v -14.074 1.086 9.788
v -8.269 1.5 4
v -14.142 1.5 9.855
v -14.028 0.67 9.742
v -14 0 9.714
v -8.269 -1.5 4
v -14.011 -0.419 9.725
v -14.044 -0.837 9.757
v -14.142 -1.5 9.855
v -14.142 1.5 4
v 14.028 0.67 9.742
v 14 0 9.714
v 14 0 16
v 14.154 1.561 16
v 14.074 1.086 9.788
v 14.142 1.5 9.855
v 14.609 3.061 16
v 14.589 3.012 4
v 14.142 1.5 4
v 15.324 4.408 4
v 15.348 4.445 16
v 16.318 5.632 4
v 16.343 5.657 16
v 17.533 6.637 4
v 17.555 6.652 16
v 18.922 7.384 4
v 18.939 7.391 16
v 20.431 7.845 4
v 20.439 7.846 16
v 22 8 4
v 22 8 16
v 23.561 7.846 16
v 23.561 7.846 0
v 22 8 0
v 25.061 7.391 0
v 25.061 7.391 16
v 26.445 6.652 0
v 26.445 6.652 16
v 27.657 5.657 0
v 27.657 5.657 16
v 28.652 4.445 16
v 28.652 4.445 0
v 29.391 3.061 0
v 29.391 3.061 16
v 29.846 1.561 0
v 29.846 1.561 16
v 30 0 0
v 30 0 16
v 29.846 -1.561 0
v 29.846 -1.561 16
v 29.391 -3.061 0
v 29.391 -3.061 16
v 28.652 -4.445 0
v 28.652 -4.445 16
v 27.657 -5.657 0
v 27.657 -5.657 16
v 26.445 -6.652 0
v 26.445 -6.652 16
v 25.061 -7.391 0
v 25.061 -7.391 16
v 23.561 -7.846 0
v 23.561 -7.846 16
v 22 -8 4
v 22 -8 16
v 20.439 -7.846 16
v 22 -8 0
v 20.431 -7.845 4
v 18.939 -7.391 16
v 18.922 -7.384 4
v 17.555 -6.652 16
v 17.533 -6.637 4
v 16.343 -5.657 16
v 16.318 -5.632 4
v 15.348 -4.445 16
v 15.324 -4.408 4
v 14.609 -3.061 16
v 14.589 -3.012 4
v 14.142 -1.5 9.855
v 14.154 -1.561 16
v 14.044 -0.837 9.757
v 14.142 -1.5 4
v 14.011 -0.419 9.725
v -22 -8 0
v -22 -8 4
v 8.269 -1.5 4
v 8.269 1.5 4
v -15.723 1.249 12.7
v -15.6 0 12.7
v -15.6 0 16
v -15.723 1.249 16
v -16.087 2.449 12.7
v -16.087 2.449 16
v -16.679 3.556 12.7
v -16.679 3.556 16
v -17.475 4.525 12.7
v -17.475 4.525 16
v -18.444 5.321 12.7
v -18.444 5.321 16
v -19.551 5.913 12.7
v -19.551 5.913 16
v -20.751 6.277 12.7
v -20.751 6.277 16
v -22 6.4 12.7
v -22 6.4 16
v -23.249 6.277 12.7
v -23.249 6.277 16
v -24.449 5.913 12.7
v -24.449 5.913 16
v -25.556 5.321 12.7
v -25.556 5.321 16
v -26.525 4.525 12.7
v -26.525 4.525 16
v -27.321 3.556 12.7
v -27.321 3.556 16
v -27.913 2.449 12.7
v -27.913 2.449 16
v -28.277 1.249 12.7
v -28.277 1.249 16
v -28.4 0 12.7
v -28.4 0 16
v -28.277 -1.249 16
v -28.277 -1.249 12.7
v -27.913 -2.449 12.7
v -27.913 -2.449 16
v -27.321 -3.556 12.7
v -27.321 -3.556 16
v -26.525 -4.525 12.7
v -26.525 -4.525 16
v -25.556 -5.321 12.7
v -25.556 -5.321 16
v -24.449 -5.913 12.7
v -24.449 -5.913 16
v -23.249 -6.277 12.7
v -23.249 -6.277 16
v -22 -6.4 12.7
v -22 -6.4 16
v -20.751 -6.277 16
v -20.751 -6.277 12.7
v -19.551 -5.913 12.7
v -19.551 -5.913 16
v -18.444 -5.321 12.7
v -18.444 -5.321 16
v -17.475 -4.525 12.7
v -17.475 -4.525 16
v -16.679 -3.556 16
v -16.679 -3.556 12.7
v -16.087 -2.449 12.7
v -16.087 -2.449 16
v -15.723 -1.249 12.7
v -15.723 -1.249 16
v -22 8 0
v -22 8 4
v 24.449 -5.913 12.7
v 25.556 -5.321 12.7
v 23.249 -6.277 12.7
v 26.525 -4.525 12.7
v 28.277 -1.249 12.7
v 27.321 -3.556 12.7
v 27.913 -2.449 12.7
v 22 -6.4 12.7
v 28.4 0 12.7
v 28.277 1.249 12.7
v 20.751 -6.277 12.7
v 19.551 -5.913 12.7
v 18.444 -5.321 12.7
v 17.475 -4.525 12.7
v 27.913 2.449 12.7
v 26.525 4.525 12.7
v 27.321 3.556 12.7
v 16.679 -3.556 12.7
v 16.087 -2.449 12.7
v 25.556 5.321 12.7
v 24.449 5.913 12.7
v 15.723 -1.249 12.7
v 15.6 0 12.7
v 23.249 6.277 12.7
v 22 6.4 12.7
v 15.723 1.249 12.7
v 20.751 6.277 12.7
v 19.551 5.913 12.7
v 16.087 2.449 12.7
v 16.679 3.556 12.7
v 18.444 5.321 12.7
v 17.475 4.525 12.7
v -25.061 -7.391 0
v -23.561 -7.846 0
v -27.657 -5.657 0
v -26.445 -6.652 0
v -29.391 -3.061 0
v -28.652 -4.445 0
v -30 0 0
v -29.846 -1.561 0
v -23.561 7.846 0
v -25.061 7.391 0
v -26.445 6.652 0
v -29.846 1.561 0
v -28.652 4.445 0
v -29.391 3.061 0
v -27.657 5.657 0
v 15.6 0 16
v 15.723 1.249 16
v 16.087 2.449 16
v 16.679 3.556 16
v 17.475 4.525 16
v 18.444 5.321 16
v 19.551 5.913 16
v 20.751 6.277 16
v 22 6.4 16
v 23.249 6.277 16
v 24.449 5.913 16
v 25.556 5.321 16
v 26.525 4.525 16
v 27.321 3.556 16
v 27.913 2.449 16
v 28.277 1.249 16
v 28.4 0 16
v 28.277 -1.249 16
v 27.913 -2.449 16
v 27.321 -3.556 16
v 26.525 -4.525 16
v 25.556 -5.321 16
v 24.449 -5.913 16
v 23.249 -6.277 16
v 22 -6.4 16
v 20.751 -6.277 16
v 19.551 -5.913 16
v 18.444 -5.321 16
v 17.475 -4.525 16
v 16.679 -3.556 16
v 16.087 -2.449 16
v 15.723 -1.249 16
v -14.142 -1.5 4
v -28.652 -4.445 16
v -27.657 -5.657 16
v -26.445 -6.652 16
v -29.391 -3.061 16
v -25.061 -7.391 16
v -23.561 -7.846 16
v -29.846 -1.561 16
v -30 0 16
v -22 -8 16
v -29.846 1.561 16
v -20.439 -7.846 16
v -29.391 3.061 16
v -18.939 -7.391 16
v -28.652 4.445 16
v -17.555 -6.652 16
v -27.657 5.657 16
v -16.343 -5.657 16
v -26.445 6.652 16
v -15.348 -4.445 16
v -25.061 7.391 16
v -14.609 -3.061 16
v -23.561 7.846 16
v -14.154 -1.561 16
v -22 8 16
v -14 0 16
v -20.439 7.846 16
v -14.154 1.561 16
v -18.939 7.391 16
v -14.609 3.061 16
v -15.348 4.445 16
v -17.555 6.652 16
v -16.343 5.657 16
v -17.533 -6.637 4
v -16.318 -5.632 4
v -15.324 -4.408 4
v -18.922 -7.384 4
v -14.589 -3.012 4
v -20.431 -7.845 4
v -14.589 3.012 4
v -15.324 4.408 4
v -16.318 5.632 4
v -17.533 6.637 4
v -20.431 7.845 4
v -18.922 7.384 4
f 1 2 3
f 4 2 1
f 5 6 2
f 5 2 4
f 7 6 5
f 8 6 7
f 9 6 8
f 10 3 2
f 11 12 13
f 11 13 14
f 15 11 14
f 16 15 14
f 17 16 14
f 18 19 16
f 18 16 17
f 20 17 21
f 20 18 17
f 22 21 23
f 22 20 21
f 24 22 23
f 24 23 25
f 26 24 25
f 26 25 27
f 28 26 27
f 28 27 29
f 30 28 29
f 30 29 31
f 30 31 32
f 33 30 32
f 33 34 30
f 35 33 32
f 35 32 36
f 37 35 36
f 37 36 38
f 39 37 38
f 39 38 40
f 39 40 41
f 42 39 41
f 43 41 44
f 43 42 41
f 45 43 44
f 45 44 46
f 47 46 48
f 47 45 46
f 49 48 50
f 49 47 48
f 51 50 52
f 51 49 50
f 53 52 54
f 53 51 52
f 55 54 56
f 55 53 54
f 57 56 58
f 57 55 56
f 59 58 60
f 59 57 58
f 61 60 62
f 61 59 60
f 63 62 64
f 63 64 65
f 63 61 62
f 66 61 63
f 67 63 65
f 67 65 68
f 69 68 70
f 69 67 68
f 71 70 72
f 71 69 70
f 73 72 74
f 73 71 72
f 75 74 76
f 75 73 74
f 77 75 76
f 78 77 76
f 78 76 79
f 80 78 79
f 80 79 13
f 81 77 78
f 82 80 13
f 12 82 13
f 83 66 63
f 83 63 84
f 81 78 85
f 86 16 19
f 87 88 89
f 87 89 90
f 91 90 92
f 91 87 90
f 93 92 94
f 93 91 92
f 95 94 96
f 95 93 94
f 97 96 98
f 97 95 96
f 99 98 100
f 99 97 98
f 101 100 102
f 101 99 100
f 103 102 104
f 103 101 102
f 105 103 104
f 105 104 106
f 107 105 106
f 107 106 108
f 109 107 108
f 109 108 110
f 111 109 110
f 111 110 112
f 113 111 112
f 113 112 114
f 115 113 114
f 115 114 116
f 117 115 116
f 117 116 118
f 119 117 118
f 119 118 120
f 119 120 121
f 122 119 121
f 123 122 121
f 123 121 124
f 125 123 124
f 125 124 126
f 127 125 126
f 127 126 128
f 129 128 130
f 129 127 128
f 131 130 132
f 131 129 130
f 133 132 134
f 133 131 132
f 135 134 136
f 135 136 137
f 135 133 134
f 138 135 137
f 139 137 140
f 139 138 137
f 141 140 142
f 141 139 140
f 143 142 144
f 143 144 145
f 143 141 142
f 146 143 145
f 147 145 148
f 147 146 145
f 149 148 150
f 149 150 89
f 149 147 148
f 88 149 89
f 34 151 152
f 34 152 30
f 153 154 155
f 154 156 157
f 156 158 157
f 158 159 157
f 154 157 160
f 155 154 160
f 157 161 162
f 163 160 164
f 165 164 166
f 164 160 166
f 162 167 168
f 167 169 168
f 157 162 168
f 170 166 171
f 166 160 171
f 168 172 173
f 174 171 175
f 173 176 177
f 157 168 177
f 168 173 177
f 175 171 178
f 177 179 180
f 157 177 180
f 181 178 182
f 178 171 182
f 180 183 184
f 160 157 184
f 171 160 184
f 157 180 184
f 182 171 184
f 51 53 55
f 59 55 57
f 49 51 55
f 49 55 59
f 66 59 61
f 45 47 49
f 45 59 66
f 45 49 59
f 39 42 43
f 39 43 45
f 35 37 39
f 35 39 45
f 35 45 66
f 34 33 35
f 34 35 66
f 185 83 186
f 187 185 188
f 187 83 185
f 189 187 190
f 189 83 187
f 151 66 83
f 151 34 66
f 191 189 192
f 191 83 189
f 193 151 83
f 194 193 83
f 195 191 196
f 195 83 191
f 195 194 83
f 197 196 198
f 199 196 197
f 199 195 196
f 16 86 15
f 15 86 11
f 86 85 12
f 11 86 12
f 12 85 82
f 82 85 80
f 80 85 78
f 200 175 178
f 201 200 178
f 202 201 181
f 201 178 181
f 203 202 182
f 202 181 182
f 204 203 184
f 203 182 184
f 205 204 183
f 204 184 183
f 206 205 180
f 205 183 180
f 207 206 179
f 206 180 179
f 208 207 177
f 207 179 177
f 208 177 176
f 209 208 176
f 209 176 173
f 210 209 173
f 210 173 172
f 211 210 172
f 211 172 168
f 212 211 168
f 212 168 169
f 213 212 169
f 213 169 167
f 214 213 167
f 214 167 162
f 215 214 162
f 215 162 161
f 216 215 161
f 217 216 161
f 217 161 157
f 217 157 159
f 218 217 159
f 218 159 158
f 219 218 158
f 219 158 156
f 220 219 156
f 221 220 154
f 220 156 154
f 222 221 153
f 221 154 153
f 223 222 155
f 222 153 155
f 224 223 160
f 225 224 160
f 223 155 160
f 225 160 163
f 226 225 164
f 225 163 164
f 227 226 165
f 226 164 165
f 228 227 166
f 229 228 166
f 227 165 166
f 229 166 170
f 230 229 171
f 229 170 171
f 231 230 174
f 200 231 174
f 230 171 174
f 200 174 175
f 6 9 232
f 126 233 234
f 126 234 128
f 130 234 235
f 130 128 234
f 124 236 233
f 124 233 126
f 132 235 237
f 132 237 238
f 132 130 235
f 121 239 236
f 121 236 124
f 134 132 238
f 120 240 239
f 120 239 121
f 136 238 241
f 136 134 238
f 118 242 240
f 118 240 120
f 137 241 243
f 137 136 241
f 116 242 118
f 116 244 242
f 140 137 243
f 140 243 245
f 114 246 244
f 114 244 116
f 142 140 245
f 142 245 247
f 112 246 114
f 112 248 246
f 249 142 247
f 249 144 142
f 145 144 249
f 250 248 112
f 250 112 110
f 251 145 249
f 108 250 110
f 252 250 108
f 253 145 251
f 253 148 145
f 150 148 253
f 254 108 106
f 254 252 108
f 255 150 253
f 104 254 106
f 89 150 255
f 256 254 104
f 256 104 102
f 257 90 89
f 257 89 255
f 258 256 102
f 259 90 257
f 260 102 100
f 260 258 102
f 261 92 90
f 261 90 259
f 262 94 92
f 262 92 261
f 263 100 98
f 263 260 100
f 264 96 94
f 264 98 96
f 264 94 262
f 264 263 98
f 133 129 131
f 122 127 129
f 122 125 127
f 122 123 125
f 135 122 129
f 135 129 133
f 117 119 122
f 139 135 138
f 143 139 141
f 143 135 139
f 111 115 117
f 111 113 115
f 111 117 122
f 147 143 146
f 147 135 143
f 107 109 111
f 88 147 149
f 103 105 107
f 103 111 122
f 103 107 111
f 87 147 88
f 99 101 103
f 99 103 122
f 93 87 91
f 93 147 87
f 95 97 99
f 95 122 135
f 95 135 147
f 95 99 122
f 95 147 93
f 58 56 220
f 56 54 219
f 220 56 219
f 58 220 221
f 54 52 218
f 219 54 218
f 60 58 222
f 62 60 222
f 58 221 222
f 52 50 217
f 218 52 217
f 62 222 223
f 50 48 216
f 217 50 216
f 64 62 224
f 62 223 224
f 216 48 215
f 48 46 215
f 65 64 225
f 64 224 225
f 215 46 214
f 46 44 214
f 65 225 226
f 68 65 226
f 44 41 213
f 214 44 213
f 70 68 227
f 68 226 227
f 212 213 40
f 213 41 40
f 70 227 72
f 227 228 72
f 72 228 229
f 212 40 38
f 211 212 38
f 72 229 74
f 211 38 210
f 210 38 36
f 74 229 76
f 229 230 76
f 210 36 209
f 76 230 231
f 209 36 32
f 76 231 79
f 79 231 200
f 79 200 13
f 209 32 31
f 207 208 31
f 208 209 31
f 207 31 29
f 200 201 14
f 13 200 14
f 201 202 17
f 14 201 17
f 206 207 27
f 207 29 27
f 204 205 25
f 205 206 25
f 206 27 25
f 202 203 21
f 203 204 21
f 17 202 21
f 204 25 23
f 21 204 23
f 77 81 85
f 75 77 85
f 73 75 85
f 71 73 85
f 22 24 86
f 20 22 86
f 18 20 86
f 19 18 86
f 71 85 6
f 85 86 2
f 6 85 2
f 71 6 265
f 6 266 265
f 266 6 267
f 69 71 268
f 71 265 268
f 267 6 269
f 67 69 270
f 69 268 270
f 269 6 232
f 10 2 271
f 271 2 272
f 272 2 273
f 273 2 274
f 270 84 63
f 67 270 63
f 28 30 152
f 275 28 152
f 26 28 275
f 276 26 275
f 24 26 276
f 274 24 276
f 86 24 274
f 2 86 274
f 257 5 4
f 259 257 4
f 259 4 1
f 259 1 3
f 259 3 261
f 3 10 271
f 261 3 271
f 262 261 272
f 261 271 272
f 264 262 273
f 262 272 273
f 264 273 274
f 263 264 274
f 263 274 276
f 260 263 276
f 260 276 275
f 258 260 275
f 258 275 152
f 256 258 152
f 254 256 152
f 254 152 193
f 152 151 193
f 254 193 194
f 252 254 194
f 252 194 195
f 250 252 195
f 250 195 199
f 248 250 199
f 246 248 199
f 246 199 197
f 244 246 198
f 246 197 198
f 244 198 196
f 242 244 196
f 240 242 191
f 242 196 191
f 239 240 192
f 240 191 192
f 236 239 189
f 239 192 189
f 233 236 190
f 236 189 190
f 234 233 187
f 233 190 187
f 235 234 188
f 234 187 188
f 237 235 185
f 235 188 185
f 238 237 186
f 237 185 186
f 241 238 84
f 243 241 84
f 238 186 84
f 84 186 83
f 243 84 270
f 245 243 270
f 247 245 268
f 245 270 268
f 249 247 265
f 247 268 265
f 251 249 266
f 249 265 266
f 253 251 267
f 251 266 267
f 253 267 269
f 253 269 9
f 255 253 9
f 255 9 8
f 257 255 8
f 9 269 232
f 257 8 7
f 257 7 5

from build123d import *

# Parameters (mm, degrees)
F1_R     = 8
F1_R_2   = 6.4
F2_DEPTH = 16
F3_DEPTH = 4
F4_DEPTH = 8.7
F6_DEPTH = 1.5


with BuildPart() as f2:
    # F1 (on Top) → F2 (new body)
    with BuildSketch(Plane.XY):
        with Locations((-22, 0)):
            Circle(F1_R)
        with Locations((-22, 0)):
            Circle(F1_R_2, mode=Mode.SUBTRACT)
    extrude(amount=F2_DEPTH)

    # F0 (on Top) → F3 (join)
    with BuildSketch(Plane.XY):
        with BuildLine():
            Line((0, 8), (-22, 8))
            ThreePointArc((-22, 8), (-30, 0), (-22, -8))
            Line((-22, -8), (0, -8))
            Line((0, -8), (0, 8))
        make_face()
    extrude(amount=F3_DEPTH)

    # F4 (add): a face of the model
    f4_faces = [f2.faces().sort_by_distance(p)[0] for p in [
        (-22, 0, 4),
    ]]
    extrude(f4_faces, amount=F4_DEPTH)

    # F5 (on Front) → F6 (join, symmetric)
    with BuildSketch(Plane.XZ):
        Polygon((-8.2692483334, 4), (-14.318941161, 10.031673433), (-14.3099449018, 4), align=None)
    extrude(amount=F6_DEPTH, both=True)

    # F7: F2 across plane


with BuildPart() as f2_1:
    add(f2.part)
    add(f2.part.mirror(Plane.YZ))


solid = f2_1.part
